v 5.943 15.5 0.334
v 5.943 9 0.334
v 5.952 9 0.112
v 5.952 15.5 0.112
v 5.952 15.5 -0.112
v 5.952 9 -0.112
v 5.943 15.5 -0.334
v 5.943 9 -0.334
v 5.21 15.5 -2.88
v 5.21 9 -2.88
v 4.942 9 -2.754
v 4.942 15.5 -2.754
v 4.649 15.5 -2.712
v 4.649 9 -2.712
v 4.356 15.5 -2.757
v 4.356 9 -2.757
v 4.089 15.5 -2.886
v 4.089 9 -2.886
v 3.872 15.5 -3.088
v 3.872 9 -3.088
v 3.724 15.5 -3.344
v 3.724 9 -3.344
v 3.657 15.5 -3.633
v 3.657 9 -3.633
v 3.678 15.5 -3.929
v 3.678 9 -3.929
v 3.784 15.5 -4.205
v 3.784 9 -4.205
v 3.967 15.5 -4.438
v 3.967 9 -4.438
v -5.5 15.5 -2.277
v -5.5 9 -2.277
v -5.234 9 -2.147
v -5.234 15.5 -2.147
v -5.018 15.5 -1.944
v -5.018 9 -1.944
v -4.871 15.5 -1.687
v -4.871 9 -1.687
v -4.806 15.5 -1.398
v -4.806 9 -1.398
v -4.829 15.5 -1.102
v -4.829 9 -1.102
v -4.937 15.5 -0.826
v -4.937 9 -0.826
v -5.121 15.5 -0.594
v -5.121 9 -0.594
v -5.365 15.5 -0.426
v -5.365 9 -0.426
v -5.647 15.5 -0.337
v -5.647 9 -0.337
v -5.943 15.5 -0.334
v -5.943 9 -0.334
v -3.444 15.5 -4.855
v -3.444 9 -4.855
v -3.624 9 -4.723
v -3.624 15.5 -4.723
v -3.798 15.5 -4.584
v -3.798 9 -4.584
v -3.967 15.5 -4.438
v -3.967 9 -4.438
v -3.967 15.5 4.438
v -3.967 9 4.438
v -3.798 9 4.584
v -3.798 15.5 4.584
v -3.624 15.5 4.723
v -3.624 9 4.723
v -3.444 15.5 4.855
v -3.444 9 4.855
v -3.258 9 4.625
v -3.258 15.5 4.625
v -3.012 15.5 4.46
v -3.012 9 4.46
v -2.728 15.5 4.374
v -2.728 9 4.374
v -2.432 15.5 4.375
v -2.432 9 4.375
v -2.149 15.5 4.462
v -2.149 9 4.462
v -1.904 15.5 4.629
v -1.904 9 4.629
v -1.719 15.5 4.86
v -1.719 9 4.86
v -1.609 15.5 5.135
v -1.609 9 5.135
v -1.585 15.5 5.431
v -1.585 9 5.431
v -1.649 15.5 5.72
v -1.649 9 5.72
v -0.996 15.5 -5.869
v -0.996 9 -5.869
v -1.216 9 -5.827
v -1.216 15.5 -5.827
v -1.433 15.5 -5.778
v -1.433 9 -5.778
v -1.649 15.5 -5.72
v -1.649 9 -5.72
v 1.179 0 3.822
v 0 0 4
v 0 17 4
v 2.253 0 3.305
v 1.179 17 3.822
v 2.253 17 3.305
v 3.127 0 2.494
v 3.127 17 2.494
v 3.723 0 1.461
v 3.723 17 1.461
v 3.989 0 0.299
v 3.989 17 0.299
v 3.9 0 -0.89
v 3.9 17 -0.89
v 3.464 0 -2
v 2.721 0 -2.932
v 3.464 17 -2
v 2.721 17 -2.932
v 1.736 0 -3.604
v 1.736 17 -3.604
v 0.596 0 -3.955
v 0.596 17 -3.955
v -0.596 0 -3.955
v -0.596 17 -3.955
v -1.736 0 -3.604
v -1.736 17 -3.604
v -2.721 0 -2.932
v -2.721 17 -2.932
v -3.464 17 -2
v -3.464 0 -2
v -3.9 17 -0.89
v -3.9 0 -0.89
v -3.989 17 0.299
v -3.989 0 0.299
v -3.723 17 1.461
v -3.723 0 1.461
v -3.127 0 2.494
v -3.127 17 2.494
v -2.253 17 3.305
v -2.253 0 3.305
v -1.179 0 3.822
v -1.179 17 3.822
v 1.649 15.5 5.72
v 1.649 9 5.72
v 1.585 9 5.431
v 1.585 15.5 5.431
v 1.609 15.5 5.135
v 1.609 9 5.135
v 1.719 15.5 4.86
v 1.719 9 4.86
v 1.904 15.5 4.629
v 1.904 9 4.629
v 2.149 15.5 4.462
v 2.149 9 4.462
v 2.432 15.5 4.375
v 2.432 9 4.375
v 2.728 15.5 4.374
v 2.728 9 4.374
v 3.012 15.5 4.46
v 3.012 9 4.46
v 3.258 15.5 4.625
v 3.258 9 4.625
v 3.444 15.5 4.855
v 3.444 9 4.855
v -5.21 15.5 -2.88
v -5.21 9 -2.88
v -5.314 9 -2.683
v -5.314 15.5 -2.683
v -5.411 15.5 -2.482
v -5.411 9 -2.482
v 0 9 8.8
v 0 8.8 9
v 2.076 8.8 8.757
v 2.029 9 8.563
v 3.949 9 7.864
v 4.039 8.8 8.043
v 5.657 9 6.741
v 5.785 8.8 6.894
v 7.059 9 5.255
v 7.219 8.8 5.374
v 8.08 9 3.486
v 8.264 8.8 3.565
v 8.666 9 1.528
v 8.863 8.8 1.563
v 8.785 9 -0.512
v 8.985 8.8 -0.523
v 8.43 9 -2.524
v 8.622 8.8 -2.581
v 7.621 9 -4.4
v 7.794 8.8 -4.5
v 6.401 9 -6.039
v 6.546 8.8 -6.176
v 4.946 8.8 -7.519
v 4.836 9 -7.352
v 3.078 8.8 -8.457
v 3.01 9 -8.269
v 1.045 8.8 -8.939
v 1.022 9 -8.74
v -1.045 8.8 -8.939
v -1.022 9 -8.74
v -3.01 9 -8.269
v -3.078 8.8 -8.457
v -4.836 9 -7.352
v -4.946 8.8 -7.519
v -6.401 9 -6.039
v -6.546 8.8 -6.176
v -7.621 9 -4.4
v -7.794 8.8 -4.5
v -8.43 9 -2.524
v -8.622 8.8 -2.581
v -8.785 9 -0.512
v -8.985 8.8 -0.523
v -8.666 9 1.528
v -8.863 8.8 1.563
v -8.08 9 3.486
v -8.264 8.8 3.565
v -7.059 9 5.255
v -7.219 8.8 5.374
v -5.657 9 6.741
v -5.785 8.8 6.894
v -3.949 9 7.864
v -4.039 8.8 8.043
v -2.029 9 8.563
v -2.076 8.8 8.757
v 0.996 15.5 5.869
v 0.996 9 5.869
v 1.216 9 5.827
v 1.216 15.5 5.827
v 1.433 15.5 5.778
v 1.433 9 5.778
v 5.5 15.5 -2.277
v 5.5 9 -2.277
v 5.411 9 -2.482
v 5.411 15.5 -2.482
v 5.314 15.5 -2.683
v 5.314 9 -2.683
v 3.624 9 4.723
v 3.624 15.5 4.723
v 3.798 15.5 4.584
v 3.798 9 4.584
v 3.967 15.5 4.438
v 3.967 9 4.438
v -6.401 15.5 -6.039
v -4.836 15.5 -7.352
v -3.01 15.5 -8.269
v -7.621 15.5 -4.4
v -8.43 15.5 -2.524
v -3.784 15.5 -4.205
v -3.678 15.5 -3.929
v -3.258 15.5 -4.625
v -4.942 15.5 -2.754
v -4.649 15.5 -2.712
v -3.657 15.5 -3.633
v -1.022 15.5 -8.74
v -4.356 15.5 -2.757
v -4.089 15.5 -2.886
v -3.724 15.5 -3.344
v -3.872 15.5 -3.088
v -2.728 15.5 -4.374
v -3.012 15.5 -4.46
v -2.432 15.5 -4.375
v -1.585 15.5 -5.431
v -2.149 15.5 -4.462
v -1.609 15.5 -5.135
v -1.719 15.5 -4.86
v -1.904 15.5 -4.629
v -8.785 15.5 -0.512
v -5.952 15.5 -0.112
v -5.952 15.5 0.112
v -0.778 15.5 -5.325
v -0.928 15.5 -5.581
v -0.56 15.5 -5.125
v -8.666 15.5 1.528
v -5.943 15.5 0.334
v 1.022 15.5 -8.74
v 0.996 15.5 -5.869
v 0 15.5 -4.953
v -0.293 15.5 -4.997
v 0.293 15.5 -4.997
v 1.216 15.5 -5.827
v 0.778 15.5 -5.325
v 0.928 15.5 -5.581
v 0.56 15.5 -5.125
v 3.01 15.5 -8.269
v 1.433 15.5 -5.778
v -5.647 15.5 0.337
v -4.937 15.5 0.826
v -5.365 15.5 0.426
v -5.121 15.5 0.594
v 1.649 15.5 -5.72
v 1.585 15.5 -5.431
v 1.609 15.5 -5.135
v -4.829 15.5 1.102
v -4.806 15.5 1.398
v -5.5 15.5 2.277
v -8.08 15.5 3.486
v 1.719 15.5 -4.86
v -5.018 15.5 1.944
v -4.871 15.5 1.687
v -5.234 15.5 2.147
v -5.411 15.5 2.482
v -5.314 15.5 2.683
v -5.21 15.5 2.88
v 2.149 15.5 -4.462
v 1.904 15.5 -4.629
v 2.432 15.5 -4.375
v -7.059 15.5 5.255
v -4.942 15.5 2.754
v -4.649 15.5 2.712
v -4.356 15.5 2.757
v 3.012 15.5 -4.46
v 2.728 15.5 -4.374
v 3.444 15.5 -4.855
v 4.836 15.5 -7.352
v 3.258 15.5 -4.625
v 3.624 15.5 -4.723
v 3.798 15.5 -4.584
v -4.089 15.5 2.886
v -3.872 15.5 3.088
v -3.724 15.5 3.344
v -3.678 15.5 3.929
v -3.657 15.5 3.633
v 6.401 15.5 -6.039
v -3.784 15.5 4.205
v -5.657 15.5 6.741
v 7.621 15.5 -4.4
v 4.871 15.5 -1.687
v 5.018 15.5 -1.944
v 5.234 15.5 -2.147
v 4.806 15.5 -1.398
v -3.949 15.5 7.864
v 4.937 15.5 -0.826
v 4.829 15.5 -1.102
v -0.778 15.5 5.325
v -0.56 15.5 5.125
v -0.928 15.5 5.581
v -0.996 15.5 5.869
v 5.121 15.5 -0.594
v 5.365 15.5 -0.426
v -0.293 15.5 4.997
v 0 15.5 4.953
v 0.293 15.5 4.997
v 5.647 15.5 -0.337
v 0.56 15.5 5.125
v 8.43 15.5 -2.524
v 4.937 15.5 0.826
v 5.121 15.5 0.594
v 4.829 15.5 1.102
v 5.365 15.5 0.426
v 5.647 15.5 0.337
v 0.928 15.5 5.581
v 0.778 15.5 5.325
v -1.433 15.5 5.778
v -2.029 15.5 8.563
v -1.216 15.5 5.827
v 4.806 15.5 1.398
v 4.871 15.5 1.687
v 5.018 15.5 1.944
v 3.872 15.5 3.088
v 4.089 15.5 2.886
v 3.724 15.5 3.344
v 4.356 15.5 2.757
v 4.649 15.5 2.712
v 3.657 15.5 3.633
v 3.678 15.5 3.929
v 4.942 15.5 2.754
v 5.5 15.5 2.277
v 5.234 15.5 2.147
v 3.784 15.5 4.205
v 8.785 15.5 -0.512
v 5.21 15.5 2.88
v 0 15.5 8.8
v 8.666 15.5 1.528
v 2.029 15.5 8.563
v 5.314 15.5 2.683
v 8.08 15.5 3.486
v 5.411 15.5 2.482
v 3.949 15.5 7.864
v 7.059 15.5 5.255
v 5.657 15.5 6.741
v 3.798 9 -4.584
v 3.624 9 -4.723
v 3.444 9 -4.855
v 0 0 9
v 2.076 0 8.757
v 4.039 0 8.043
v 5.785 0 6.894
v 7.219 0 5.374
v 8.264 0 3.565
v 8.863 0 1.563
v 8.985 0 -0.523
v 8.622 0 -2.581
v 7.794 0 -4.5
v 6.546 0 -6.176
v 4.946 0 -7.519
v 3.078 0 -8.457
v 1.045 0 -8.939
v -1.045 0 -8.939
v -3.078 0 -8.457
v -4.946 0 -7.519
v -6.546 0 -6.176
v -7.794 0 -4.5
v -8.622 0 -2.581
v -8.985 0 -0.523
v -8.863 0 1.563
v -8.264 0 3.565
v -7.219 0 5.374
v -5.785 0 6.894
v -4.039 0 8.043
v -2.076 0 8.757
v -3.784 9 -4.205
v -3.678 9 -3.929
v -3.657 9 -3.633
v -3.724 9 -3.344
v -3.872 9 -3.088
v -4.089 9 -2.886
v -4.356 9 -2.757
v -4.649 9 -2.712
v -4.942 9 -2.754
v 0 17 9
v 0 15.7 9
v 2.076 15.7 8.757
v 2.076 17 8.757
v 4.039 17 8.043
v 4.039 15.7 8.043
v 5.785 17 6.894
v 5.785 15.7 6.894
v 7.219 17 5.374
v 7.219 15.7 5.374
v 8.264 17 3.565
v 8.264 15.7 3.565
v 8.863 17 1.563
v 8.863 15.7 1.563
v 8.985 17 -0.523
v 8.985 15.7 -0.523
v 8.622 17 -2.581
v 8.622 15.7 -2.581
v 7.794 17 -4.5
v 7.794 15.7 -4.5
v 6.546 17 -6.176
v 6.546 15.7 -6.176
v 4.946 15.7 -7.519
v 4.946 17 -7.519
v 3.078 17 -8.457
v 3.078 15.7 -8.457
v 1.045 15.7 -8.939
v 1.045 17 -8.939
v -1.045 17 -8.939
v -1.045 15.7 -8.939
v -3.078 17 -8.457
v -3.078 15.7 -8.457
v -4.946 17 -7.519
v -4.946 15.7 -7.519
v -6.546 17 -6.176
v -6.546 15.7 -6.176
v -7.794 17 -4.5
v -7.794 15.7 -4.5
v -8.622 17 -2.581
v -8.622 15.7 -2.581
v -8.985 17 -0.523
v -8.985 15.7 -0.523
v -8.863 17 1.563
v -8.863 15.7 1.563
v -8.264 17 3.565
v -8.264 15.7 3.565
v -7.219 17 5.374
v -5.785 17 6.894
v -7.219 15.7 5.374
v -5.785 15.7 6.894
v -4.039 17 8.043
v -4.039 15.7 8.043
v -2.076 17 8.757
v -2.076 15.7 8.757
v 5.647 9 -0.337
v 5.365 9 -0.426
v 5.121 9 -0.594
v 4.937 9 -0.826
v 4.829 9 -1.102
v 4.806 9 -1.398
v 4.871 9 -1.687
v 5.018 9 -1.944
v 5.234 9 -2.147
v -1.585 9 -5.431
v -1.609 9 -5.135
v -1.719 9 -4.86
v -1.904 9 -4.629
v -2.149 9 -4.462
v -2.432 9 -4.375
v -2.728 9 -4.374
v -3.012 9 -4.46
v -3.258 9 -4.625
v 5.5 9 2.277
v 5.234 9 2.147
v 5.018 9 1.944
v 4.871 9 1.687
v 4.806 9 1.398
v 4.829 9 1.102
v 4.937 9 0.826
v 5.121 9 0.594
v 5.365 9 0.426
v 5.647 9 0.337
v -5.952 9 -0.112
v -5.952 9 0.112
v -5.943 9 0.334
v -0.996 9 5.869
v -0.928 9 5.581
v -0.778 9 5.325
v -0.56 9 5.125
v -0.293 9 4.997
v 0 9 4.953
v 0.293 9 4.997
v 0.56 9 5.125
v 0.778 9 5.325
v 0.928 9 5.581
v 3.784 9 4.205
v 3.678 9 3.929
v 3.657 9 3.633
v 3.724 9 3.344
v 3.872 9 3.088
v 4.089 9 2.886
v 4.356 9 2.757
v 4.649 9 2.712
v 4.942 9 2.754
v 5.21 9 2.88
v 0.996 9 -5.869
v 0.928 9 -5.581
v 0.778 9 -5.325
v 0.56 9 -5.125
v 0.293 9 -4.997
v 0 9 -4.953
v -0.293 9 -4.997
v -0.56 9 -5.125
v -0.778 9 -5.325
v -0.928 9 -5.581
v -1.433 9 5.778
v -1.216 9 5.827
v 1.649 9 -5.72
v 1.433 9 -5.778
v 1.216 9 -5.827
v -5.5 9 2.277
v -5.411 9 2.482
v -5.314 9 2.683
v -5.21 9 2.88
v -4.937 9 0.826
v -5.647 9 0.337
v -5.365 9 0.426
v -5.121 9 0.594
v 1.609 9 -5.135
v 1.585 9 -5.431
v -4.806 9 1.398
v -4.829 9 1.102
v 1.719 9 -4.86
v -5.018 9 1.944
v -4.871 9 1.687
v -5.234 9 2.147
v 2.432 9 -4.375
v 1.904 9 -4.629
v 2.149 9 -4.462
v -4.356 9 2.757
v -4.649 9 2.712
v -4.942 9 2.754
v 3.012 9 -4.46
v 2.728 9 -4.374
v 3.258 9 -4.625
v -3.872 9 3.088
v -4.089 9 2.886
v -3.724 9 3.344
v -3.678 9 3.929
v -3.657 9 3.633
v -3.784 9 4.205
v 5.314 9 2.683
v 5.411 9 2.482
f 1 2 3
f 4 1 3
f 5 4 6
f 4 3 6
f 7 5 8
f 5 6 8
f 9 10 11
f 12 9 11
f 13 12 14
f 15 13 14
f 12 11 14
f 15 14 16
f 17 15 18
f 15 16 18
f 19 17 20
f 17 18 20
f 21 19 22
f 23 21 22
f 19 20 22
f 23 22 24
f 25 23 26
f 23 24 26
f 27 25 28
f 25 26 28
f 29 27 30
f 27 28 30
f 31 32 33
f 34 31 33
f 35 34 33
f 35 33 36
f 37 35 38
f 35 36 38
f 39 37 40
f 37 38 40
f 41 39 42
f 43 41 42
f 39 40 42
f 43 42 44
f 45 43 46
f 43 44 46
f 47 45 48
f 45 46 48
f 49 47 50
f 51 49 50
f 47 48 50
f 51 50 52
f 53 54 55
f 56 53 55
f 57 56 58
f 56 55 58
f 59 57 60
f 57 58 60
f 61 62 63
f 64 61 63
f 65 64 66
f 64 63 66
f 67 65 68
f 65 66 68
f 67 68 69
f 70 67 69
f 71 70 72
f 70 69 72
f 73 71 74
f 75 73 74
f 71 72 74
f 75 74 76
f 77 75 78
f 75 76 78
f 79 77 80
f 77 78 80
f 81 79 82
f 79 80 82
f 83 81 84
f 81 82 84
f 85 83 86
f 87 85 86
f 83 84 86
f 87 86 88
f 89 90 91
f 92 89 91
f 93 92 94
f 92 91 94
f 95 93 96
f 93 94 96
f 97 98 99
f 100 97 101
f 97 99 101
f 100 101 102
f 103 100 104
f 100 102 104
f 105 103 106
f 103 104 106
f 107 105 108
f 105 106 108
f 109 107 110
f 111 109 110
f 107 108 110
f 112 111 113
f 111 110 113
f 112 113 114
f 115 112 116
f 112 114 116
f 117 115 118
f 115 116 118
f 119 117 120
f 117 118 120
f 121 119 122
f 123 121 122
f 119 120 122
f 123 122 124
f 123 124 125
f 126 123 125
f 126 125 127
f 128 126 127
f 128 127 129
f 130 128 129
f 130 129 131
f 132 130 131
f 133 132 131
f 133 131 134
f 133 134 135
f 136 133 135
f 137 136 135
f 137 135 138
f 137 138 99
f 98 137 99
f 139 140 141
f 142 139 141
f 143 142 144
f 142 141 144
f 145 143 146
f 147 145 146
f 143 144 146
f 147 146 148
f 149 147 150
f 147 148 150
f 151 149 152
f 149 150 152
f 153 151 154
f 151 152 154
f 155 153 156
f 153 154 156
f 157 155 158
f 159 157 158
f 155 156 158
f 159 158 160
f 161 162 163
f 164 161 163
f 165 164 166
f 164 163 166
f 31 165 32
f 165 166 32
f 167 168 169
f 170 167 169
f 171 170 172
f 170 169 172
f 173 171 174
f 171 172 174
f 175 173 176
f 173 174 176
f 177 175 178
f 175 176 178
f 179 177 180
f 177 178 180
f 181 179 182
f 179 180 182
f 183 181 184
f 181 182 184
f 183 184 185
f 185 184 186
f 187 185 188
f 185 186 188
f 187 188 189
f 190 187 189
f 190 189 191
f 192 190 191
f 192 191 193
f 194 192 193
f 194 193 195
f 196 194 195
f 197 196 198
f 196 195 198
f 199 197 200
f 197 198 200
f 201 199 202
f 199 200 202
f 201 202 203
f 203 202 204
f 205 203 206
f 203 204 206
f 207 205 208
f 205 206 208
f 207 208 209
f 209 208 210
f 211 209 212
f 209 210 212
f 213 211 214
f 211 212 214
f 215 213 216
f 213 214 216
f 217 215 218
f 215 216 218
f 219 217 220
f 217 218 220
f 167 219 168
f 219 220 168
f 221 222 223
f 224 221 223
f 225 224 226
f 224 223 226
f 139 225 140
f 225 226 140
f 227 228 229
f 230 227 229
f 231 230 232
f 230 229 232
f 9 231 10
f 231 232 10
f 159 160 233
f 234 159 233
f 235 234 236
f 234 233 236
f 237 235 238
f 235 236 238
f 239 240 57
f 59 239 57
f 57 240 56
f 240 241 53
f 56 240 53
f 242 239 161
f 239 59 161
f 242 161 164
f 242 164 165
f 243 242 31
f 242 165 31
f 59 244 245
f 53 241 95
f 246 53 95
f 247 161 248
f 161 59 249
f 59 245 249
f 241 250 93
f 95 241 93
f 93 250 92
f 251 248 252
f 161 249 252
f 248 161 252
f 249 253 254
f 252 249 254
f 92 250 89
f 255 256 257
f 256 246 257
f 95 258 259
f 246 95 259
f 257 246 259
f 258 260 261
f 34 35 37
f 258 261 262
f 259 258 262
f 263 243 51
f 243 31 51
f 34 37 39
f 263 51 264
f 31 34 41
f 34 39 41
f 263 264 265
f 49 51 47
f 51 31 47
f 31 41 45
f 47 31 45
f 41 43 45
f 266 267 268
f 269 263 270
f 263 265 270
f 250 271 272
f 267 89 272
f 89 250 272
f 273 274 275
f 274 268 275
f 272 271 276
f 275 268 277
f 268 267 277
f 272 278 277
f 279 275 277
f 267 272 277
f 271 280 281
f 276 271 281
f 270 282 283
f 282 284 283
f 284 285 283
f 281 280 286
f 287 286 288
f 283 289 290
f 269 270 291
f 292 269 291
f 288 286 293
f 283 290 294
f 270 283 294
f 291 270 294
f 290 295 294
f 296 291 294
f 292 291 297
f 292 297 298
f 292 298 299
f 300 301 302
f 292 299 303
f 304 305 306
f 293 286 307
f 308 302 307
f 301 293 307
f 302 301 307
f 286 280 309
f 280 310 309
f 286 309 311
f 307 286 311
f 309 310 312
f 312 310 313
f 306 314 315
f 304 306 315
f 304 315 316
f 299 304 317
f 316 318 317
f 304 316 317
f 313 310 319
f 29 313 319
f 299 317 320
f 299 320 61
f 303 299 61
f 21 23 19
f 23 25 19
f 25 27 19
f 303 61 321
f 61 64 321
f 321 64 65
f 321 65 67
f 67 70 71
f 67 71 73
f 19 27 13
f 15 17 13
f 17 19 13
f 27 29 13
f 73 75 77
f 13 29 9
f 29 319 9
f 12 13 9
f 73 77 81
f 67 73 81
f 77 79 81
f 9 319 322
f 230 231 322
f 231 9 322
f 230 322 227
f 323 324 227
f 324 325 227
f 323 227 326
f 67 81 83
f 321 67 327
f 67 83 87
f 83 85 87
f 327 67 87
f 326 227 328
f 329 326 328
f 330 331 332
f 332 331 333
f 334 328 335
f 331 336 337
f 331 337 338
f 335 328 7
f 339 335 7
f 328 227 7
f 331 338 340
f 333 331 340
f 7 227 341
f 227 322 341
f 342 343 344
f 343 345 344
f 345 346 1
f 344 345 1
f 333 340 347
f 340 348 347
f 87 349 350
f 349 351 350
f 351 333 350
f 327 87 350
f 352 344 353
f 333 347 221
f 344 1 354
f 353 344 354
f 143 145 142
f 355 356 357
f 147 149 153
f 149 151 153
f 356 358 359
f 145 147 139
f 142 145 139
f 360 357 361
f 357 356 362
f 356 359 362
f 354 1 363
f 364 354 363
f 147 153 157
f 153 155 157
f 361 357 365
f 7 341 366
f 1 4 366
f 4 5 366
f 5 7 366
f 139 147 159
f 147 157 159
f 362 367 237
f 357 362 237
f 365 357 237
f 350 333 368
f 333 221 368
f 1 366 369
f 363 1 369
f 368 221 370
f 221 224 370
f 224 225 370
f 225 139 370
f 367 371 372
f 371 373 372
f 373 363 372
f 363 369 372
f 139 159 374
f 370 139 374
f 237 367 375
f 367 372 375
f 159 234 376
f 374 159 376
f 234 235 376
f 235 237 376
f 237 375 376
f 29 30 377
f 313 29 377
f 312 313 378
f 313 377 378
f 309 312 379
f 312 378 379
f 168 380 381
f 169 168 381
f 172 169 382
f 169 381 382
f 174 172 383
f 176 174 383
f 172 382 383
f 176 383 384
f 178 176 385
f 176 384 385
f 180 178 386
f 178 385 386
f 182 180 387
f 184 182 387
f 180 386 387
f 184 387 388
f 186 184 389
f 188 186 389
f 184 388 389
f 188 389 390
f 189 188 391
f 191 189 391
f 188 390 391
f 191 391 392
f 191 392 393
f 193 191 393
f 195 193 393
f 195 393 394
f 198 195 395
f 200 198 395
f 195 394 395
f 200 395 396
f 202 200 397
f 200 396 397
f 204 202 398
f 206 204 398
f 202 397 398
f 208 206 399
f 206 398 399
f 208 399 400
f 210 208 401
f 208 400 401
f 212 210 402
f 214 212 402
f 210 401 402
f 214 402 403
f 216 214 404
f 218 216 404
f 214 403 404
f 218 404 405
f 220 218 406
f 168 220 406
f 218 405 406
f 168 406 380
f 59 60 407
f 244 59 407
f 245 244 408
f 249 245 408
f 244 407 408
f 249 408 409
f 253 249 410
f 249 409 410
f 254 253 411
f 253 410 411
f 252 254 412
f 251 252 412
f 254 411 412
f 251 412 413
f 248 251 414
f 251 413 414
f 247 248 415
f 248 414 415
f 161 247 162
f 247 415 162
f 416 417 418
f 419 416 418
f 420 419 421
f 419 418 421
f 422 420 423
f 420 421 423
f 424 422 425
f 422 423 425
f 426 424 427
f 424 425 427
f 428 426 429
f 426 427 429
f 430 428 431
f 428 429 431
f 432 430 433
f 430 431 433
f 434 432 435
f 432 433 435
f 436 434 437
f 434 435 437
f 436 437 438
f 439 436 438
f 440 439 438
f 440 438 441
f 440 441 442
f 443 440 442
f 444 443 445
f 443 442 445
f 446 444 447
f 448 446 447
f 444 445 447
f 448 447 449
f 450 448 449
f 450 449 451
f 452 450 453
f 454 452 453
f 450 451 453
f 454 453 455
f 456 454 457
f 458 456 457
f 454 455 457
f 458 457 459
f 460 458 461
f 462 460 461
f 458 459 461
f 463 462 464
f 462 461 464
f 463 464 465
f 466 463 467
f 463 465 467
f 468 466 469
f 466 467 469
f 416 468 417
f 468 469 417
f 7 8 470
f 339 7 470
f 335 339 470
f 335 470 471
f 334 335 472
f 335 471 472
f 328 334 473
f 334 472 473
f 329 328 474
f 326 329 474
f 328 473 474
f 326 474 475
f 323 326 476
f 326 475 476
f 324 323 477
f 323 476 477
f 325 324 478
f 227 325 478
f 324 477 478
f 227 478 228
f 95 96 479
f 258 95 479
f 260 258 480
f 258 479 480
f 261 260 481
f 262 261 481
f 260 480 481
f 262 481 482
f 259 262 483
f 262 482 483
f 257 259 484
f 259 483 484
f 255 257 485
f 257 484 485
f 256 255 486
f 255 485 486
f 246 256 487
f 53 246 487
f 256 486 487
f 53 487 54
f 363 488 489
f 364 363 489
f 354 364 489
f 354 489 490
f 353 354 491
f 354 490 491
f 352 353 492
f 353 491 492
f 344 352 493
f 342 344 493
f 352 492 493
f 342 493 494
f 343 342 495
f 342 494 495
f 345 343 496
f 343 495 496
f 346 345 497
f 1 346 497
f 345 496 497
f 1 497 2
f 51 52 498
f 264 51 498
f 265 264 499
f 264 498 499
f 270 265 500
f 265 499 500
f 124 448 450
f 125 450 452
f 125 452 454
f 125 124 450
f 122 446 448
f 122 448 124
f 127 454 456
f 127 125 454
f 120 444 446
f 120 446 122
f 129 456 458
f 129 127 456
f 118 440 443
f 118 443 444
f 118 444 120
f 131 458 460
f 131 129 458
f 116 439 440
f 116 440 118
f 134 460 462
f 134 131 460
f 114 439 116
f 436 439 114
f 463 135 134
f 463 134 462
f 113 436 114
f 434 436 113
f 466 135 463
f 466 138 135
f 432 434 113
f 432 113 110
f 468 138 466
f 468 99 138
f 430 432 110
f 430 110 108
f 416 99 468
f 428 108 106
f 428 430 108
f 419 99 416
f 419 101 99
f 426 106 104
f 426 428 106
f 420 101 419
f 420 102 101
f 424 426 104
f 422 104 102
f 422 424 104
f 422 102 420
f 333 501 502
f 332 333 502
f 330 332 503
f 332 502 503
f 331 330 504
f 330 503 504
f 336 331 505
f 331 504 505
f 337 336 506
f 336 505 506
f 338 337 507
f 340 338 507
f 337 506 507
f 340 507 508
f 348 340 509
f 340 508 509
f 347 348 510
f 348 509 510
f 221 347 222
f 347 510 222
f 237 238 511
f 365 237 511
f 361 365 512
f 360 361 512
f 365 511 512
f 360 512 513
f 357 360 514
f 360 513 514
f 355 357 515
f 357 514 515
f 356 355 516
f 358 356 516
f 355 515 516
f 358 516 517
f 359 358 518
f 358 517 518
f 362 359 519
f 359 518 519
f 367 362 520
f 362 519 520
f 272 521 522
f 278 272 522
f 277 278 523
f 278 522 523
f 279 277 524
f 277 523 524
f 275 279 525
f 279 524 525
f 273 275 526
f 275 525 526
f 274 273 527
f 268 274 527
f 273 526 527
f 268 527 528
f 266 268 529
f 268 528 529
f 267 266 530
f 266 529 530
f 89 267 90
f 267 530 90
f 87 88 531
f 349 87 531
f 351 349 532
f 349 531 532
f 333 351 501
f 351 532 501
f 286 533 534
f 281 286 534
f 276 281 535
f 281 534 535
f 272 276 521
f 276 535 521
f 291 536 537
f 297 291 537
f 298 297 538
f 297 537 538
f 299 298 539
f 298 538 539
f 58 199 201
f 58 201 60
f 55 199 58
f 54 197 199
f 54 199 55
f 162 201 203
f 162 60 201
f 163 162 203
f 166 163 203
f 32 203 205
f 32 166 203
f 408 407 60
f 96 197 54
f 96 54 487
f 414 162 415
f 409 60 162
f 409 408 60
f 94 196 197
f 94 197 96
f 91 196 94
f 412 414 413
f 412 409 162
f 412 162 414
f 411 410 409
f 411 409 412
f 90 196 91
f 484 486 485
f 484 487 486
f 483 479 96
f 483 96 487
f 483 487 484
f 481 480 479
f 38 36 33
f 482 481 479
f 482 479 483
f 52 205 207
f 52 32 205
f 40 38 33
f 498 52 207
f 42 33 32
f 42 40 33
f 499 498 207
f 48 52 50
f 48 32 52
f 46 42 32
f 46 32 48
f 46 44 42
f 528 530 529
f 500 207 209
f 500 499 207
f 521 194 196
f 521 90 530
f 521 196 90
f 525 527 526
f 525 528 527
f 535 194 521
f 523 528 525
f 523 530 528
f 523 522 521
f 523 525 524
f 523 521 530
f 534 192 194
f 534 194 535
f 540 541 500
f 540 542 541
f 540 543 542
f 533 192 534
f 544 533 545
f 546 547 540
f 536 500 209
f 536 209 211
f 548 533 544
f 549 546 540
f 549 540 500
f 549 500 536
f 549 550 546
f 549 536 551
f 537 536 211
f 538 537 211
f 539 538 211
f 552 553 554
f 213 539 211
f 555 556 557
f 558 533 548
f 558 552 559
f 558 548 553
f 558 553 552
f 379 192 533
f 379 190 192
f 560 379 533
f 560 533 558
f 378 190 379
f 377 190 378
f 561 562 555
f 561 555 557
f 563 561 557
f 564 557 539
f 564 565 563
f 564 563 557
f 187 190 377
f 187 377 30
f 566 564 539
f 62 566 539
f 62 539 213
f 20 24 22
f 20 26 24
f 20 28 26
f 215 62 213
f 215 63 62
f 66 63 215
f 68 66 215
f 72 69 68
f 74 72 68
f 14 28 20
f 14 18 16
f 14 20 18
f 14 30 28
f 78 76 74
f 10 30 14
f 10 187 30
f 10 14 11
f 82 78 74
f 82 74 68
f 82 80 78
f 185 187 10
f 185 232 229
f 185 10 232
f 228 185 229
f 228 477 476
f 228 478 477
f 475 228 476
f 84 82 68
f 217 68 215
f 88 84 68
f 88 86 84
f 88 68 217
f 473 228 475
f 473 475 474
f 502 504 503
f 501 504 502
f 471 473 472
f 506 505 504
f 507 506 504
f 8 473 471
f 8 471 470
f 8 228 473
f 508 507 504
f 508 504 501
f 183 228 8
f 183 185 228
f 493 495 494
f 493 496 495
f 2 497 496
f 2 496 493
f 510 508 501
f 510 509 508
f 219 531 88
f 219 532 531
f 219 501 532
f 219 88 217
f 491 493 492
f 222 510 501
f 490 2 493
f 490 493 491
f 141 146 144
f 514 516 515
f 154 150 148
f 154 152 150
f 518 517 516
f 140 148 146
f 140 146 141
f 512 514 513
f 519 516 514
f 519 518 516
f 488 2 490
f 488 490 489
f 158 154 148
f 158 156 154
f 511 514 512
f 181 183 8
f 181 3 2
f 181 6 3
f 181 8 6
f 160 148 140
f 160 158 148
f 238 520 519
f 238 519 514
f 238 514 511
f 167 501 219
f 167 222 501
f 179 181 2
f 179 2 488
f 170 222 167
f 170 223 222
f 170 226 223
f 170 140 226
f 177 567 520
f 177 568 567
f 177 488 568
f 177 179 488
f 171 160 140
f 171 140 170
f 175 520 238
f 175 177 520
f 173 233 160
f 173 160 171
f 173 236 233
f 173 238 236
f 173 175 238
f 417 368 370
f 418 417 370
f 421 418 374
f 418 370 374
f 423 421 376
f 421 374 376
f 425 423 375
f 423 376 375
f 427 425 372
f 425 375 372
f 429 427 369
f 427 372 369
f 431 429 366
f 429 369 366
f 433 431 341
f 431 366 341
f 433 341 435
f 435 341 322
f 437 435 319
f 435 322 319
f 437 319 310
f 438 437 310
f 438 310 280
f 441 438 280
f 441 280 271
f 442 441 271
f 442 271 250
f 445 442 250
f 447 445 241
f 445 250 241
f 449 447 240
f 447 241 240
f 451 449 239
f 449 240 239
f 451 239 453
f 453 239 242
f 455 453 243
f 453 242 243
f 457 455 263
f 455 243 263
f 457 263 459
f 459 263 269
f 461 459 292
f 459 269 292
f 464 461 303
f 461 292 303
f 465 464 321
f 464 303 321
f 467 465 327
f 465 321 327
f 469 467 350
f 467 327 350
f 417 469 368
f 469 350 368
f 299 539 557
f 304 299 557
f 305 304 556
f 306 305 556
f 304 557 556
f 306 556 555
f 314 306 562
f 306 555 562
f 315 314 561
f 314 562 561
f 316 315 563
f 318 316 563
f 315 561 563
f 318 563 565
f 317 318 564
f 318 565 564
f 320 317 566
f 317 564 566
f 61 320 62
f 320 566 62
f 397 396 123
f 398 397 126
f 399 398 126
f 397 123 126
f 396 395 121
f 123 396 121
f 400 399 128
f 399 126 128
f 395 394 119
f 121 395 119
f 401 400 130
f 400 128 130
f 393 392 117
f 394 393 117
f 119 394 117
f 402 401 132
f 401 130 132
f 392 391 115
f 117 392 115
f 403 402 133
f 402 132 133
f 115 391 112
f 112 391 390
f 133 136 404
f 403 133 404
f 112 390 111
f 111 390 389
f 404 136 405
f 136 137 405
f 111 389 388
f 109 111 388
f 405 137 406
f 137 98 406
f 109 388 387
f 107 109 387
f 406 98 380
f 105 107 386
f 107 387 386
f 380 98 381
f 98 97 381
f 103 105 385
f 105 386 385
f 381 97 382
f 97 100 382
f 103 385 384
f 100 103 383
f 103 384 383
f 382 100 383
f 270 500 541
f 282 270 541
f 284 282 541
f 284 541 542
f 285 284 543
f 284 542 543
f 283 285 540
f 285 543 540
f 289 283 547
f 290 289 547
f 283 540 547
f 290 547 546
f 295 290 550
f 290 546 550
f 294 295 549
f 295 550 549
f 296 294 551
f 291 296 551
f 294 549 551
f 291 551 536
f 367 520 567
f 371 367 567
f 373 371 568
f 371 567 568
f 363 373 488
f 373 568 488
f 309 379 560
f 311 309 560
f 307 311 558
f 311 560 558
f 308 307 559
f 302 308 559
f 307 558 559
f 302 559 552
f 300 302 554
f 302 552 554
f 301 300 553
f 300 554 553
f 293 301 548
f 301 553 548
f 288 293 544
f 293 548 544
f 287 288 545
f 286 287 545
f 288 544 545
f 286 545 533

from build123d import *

# Parameters (mm, degrees)
SKETCH_2_R          = 9
EXTRUDE_1_DEPTH     = 9
EXTRUDE_2_DEPTH     = 6.5
SKETCH_4_R          = 9
EXTRUDE_3_DEPTH     = 1.5
SKETCH_5_R          = 4
CUT_EXTRUDE_1_DEPTH = 22.236760582
CHAMFER_1_SIZE      = 0.2


with BuildPart() as part:
    # 草图2 → 凸台-拉伸1 (new body)
    with BuildSketch(Plane(origin=(0, 0, 0), x_dir=(1, 0, 0), z_dir=(0, 1, 0))):
        with Locations(Location((0, 0, 0), (0, 0, 270))):
            Circle(SKETCH_2_R)
    extrude(amount=EXTRUDE_1_DEPTH)

    # 草图3 → 凸台-拉伸2 (add)
    with BuildSketch(Plane(origin=(0, 9, 0), x_dir=(1, 0, 0), z_dir=(0, 1, 0))):
        with BuildLine():
            ThreePointArc((-3.444184526, 4.855302323), (-3.711538364, 4.654121901), (-3.967166599, 4.438238037))
            ThreePointArc((-3.967166599, 4.438238037), (-3.872290418, 3.088048563), (-5.20973976, 2.880100577))
            ThreePointArc((-5.20973976, 2.880100577), (-5.363328331, 2.582842797), (-5.499972914, 2.277425222))
            ThreePointArc((-5.499972914, 2.277425222), (-4.828667171, 1.102111772), (-5.943442141, 0.334459589))
            ThreePointArc((-5.943442141, 0.334459589), (-5.952845345, 0), (-5.943442141, -0.334459589))
            ThreePointArc((-5.943442141, -0.334459589), (-4.828667171, -1.102111772), (-5.499972914, -2.277425222))
            ThreePointArc((-5.499972914, -2.277425222), (-5.363328331, -2.582842797), (-5.20973976, -2.880100577))
            ThreePointArc((-5.20973976, -2.880100577), (-3.872290418, -3.088048563), (-3.967166599, -4.438238037))
            ThreePointArc((-3.967166599, -4.438238037), (-3.711538364, -4.654121901), (-3.444184526, -4.855302323))
            ThreePointArc((-3.444184526, -4.855302323), (-2.148959057, -4.462359463), (-1.648614285, -5.720003377))
            ThreePointArc((-1.648614285, -5.720003377), (-1.324632706, -5.803595083), (-0.996466307, -5.868851898))
            ThreePointArc((-0.996466307, -5.868851898), (0, -4.952845345), (0.996466307, -5.868851898))
            ThreePointArc((0.996466307, -5.868851898), (1.324632706, -5.803595083), (1.648614285, -5.720003377))
            ThreePointArc((1.648614285, -5.720003377), (2.148959057, -4.462359463), (3.444184526, -4.855302323))
            ThreePointArc((3.444184526, -4.855302323), (3.711538364, -4.654121901), (3.967166599, -4.438238037))
            ThreePointArc((3.967166599, -4.438238037), (3.872290418, -3.088048563), (5.20973976, -2.880100577))
            ThreePointArc((5.20973976, -2.880100577), (5.363328331, -2.582842797), (5.499972914, -2.277425222))
            ThreePointArc((5.499972914, -2.277425222), (4.828667171, -1.102111772), (5.943442141, -0.334459589))
            ThreePointArc((5.943442141, -0.334459589), (5.952845345, 0), (5.943442141, 0.334459589))
            ThreePointArc((5.943442141, 0.334459589), (4.828667171, 1.102111772), (5.499972914, 2.277425222))
            ThreePointArc((5.499972914, 2.277425222), (5.363328331, 2.582842797), (5.20973976, 2.880100577))
            ThreePointArc((5.20973976, 2.880100577), (3.872290418, 3.088048563), (3.967166599, 4.438238037))
            ThreePointArc((3.967166599, 4.438238037), (3.711538364, 4.654121901), (3.444184526, 4.855302323))
            ThreePointArc((3.444184526, 4.855302323), (2.148959057, 4.462359463), (1.648614285, 5.720003377))
            ThreePointArc((1.648614285, 5.720003377), (1.324632706, 5.803595083), (0.996466307, 5.868851898))
            ThreePointArc((0.996466307, 5.868851898), (0, 4.952845345), (-0.996466307, 5.868851898))
            ThreePointArc((-0.996466307, 5.868851898), (-1.324632706, 5.803595083), (-1.648614285, 5.720003377))
            ThreePointArc((-1.648614285, 5.720003377), (-2.148959057, 4.462359463), (-3.444184526, 4.855302323))
        make_face()
    extrude(amount=EXTRUDE_2_DEPTH)

    # 草图4 → 凸台-拉伸3 (add)
    with BuildSketch(Plane(origin=(0, 15.5, 0), x_dir=(1, 0, 0), z_dir=(0, 1, 0))):
        with Locations(Location((0, 0, 0), (0, 0, 270))):
            Circle(SKETCH_4_R)
    extrude(amount=EXTRUDE_3_DEPTH)

    # 草图5 → 切除-拉伸1 (cut, through all)
    with BuildSketch(Plane(origin=(0, 17, 0), x_dir=(1, 0, 0), z_dir=(0, 1, 0))):
        with Locations(Location((0, 0, 0), (0, 0, 270))):
            Circle(SKETCH_5_R)
    extrude(amount=-CUT_EXTRUDE_1_DEPTH, mode=Mode.SUBTRACT)

    # 倒角1
    chamfer_1_edges = [part.edges().sort_by_distance(p)[0] for p in [
        (0, 9, -9),
        (0, 15.5, -9),
    ]]
    chamfer(chamfer_1_edges, length=CHAMFER_1_SIZE)


solid = part.part
